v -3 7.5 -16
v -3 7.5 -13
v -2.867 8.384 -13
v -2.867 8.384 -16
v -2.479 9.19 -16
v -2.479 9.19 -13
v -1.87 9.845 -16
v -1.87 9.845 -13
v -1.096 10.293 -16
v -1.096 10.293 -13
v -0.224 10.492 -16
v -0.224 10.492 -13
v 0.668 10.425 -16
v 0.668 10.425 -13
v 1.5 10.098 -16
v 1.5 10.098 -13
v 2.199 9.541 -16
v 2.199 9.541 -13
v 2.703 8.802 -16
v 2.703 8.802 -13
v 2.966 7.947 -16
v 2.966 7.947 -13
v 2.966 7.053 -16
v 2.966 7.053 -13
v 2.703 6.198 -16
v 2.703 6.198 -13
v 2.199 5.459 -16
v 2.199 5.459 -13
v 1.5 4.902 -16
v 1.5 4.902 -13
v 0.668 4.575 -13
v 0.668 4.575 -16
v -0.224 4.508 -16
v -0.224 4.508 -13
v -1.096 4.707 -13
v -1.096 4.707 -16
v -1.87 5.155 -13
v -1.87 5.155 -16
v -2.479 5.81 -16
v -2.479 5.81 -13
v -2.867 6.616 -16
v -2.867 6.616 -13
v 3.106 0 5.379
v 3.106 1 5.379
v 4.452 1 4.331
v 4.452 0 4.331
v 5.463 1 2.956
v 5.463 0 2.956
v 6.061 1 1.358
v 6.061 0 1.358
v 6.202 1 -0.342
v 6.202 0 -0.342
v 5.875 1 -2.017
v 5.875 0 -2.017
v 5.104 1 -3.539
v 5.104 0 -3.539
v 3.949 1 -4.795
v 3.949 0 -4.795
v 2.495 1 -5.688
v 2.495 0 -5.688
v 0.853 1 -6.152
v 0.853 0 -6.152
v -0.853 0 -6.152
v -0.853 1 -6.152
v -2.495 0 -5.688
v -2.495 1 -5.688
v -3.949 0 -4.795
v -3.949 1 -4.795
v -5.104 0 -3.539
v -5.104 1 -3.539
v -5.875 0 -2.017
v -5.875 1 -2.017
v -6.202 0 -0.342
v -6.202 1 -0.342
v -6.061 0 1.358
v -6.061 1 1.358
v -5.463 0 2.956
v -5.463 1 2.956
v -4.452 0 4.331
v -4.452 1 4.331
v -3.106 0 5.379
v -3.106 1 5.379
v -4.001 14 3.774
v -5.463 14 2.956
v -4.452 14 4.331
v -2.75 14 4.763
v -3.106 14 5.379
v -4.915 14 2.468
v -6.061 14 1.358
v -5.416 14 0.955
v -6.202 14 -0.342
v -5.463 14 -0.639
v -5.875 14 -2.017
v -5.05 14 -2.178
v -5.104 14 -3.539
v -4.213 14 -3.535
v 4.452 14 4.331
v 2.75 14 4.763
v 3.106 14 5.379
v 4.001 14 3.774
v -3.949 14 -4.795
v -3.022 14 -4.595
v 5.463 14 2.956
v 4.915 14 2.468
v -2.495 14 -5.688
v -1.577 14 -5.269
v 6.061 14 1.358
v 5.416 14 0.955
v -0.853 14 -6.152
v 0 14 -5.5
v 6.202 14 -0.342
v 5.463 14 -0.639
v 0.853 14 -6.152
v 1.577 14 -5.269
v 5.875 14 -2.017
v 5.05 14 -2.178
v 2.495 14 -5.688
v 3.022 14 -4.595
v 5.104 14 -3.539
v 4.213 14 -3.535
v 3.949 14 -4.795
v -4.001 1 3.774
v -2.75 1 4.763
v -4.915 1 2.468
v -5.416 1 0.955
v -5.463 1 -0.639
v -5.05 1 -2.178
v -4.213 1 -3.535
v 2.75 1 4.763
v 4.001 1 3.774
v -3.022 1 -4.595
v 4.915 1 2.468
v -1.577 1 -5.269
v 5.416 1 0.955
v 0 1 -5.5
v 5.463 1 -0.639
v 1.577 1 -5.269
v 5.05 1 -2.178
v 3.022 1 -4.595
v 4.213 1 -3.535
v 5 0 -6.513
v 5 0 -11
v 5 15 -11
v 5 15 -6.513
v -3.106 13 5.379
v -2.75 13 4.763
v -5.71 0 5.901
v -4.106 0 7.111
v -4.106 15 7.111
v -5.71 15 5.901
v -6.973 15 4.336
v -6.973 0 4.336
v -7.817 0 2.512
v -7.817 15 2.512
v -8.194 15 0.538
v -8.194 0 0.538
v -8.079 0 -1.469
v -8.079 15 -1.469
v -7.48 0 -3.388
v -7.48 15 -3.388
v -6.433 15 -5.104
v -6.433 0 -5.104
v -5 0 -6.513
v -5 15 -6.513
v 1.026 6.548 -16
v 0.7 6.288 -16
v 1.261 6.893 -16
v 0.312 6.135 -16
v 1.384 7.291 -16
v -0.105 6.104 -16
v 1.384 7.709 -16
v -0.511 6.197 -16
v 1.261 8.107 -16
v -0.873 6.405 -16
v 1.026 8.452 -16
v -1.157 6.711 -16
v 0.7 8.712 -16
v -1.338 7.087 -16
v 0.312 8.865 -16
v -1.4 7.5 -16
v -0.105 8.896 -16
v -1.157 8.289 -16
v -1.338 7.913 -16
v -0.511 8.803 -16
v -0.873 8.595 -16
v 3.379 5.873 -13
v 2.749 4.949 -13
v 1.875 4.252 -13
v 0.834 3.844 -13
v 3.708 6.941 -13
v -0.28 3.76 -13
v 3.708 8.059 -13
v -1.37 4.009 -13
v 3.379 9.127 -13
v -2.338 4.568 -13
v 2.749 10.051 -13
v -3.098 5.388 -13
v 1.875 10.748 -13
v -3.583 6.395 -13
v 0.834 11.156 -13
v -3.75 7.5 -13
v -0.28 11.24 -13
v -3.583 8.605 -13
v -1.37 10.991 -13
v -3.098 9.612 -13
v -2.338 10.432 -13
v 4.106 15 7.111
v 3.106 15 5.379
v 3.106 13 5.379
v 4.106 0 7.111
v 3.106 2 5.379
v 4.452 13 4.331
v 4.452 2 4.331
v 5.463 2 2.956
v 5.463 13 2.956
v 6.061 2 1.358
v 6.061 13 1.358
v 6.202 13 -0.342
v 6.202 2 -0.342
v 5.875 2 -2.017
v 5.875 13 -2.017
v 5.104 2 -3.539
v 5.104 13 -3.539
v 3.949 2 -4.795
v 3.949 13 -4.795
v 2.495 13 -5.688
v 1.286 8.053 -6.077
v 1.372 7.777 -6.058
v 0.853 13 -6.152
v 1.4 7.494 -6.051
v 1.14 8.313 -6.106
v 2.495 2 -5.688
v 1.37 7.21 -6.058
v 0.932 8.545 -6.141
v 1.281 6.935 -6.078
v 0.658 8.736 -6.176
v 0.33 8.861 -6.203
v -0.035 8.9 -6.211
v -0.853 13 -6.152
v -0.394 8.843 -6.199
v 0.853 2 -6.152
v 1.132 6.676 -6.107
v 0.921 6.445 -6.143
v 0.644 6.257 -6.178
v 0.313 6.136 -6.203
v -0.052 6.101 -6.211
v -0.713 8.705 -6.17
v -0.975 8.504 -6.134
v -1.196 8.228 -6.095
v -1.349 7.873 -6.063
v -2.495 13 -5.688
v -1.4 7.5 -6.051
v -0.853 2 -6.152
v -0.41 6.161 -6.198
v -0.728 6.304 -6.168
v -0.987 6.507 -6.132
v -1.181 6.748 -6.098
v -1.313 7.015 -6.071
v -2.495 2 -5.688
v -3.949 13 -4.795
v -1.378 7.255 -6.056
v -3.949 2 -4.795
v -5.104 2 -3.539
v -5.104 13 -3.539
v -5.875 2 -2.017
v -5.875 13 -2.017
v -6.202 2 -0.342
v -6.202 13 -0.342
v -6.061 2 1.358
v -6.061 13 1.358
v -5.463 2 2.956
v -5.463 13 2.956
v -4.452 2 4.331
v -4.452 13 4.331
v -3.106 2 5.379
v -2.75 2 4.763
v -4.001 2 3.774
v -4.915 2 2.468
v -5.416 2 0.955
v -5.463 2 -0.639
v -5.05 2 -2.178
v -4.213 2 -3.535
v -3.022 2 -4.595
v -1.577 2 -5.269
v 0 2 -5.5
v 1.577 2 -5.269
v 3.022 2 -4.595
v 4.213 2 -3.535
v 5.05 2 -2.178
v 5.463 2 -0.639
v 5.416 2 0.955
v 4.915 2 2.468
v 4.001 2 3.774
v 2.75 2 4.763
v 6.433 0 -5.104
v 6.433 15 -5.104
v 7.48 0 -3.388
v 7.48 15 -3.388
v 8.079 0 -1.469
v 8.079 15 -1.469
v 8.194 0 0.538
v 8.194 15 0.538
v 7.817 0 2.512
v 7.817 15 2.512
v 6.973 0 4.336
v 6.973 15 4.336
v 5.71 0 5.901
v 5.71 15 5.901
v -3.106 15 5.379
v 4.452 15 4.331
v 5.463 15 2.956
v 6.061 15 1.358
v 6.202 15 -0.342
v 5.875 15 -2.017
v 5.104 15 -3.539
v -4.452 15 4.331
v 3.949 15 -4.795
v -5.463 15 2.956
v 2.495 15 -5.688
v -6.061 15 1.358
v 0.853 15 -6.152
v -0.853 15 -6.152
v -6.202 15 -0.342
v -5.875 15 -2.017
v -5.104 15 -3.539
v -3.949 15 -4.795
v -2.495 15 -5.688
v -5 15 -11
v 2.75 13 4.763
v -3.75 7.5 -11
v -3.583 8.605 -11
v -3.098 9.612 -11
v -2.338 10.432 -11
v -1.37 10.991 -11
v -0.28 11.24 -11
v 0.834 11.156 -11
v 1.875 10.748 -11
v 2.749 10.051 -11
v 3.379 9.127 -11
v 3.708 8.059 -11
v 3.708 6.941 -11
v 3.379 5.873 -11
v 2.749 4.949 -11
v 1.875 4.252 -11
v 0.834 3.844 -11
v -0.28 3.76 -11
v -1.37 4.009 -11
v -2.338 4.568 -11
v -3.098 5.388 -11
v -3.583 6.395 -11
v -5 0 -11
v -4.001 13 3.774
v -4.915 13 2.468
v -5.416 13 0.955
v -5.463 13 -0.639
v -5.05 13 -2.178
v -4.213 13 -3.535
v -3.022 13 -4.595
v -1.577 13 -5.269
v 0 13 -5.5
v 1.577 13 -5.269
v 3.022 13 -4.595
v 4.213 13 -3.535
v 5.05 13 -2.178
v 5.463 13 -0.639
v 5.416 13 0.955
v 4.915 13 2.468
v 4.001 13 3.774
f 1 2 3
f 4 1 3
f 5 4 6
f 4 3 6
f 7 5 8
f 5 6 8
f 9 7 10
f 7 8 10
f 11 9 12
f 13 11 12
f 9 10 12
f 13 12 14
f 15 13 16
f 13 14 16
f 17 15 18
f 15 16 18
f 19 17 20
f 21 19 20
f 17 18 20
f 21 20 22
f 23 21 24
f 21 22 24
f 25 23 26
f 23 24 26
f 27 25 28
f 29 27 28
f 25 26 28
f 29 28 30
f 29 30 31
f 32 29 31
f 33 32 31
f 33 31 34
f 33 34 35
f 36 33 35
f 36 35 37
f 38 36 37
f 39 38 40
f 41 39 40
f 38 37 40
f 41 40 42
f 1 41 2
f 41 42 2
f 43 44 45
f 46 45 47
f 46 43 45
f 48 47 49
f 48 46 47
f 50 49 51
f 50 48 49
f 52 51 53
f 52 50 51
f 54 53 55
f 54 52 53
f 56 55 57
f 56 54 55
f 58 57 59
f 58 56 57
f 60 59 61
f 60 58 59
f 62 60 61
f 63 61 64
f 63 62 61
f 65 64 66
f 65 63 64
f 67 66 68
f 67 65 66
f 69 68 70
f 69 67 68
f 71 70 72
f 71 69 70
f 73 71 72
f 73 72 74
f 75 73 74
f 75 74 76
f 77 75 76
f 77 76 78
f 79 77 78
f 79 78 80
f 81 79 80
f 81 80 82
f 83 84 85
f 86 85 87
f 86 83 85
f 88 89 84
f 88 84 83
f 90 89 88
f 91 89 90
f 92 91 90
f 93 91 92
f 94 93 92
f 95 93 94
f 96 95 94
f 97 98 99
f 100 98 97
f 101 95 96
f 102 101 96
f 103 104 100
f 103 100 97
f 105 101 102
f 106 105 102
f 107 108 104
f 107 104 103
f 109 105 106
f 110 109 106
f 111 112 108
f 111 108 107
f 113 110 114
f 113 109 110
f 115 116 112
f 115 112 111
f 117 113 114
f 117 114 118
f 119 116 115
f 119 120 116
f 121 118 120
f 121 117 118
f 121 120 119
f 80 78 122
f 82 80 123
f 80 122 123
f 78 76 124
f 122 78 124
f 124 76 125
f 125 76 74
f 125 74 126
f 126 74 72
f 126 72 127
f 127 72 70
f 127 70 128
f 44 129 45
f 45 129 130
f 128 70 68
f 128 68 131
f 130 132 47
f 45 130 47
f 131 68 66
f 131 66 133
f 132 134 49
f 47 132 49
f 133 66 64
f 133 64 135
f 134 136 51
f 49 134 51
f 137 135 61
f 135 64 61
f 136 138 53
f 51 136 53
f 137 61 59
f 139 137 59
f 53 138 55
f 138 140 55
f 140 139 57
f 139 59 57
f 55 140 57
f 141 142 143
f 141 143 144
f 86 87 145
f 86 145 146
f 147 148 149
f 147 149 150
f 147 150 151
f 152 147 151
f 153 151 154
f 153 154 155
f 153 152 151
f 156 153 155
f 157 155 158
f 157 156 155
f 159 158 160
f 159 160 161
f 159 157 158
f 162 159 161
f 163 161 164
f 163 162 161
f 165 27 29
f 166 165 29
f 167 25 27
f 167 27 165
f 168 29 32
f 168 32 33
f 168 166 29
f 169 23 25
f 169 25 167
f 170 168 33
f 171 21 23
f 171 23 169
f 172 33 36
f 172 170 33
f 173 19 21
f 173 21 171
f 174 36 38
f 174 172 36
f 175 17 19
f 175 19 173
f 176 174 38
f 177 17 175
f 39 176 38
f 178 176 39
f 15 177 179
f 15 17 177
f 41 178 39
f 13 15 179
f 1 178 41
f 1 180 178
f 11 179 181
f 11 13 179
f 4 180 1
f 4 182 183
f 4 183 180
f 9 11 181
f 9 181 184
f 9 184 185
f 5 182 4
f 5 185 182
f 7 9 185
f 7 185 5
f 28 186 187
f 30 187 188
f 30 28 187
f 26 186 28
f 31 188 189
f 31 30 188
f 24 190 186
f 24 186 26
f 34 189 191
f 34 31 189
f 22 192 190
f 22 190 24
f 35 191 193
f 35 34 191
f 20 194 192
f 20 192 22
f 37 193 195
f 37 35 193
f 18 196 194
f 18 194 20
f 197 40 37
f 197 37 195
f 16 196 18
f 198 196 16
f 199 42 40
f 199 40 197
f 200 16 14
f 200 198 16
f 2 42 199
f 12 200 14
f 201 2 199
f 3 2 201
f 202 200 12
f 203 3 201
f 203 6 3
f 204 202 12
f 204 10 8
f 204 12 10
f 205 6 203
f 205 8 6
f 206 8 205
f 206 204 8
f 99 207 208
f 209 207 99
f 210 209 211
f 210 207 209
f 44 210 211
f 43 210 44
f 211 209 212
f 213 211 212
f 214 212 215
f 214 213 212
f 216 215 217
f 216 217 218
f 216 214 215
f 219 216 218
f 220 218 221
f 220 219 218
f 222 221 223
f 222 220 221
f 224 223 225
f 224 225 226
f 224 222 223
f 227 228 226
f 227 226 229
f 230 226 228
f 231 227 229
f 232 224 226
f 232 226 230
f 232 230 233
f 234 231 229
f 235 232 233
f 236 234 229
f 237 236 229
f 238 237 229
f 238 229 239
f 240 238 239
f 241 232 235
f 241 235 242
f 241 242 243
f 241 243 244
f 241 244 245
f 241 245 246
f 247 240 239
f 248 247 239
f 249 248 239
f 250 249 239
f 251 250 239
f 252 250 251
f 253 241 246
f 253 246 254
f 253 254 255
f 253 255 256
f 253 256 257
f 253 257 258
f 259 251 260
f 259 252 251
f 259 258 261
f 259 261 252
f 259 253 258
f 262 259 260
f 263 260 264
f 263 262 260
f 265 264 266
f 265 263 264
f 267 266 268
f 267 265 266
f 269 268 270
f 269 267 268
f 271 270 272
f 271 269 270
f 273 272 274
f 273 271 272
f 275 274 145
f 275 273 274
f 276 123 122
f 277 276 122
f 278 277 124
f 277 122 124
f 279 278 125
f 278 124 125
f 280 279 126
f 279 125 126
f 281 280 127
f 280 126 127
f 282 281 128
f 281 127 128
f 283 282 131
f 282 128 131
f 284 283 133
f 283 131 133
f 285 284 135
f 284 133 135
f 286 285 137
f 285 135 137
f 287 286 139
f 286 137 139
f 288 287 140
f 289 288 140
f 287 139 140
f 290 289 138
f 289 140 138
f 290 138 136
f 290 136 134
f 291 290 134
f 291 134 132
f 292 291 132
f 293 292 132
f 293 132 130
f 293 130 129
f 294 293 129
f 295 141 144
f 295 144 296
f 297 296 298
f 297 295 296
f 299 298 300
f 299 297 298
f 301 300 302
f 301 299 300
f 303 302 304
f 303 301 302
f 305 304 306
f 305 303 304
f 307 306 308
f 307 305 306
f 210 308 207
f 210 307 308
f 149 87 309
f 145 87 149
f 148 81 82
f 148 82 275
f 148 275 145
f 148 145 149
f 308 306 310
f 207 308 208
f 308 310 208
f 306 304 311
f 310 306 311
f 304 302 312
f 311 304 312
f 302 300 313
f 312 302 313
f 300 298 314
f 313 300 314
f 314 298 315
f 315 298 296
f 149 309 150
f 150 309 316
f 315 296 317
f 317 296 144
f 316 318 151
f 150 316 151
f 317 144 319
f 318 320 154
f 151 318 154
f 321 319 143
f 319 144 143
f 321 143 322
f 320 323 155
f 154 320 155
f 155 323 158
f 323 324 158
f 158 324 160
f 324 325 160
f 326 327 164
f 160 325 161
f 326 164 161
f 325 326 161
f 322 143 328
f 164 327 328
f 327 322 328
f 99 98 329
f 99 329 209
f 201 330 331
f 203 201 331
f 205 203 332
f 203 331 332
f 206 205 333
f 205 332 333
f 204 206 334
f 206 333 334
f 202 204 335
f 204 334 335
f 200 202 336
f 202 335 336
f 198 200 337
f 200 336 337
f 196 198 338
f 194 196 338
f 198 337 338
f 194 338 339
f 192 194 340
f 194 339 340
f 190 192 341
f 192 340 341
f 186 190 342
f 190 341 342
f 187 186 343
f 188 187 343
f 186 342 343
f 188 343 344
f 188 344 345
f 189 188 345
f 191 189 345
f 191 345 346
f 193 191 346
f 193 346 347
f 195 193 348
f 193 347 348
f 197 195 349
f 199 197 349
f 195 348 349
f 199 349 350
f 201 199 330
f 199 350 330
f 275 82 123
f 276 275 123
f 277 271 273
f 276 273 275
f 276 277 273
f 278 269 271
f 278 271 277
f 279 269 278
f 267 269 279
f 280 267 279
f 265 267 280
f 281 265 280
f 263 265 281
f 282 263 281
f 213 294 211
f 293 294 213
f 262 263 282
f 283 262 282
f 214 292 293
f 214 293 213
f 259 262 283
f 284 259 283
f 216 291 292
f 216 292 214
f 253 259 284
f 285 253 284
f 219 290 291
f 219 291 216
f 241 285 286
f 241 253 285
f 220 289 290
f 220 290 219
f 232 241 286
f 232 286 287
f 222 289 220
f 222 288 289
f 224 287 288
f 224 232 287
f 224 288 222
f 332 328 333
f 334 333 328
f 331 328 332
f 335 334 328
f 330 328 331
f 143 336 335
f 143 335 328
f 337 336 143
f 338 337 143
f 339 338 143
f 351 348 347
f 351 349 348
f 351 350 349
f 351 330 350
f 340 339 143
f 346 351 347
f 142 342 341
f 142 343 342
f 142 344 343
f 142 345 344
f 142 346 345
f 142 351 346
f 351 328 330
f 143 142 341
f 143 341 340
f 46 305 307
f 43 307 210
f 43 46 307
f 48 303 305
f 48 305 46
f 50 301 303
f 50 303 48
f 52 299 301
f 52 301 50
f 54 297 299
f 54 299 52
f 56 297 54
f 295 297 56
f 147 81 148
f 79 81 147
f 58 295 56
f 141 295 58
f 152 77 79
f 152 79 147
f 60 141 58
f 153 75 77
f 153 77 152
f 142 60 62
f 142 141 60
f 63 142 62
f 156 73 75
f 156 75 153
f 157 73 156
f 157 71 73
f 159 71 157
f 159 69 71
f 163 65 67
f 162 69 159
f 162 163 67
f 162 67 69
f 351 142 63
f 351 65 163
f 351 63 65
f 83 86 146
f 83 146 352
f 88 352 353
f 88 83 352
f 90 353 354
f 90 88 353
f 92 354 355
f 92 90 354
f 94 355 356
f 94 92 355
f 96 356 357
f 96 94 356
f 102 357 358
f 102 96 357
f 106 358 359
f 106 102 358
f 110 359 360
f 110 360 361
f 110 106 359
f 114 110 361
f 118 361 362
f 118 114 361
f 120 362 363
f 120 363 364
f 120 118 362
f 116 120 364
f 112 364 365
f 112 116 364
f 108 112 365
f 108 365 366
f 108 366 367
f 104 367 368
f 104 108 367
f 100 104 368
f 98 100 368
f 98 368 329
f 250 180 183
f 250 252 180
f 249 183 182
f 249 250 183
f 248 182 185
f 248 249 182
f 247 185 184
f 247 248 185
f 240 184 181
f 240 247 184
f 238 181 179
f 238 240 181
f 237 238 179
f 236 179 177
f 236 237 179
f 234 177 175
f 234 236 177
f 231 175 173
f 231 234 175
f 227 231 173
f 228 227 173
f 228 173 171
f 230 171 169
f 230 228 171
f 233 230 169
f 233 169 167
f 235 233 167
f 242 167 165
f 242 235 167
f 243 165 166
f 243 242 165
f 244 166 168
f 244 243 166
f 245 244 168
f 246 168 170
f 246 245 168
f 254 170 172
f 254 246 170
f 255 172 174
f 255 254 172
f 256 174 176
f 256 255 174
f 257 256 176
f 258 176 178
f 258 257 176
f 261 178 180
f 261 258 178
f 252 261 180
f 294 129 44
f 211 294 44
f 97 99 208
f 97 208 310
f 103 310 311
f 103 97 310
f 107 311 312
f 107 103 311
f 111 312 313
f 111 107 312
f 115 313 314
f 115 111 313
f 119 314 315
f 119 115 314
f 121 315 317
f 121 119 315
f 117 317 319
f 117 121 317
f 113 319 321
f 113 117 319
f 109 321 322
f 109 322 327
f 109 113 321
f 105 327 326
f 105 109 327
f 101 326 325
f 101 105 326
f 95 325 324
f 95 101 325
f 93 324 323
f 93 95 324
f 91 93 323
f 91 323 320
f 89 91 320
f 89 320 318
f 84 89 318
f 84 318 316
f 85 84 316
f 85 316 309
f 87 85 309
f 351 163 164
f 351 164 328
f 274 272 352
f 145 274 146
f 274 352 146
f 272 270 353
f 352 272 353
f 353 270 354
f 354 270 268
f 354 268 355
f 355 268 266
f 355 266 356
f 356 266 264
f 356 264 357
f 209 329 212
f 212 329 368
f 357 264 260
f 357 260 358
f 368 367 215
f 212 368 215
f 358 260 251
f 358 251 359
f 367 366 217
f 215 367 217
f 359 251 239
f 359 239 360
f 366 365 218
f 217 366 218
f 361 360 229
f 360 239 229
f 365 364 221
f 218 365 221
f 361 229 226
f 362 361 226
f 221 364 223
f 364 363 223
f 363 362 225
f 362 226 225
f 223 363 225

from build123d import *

# Parameters (mm, degrees)
SKETCH1_R               = 6.211279156
BOSS_EXTRUDE1_DEPTH     = 15
CUT_EXTRUDE1_DEPTH      = 21.332857777
CUT_EXTRUDE1_DEPTH_BACK = 21.332857777
BOSS_EXTRUDE3_DEPTH     = 1
SKETCH6_R               = 1.4
CUT_EXTRUDE2_DEPTH      = 10
SKETCH7_R               = 3.75
BOSS_EXTRUDE4_DEPTH     = 2
SKETCH8_R               = 3
BOSS_EXTRUDE5_DEPTH     = 3
CUT_EXTRUDE3_DEPTH      = 29.749810043
CUT_EXTRUDE3_DEPTH_BACK = 29.749810043
SKETCH9_R               = 1.4


with BuildPart() as part:
    # Sketch1 → Boss-Extrude1 (new body)
    with BuildSketch(Plane(origin=(0, 0, 0), x_dir=(1, 0, 0), z_dir=(0, 1, 0))):
        with BuildLine():
            Line((-5, 6.513455717), (-5, 11))
            Line((-5, 11), (5, 11))
            Line((5, 11), (5, 6.513455717))
            ThreePointArc((5, 6.513455717), (0, -8.211279156), (-5, 6.513455717))
        make_face()
        with Locations(Location((0, 0, 0), (0, 0, 270))):
            Circle(SKETCH1_R, mode=Mode.SUBTRACT)
    extrude(amount=BOSS_EXTRUDE1_DEPTH)

    # Sketch4 → Cut-Extrude1 (cut, two sides: drawn at the far end of the back side and taken through both)
    with BuildSketch(Plane(origin=(0, 15, 0), x_dir=(1, 0, 0), z_dir=(0, 1, 0)).offset(-CUT_EXTRUDE1_DEPTH_BACK)):
        with BuildLine():
            Line((-3.105639578, -5.379125539), (-4.105639578, -7.111176346))
            ThreePointArc((-4.105639578, -7.111176346), (0, -8.211279156), (4.105639578, -7.111176346))
            Line((4.105639578, -7.111176346), (3.105639578, -5.379125539))
            ThreePointArc((3.105639578, -5.379125539), (0, -6.211279156), (-3.105639578, -5.379125539))
        make_face()
    extrude(amount=CUT_EXTRUDE1_DEPTH + CUT_EXTRUDE1_DEPTH_BACK, mode=Mode.SUBTRACT)

    # Sketch5 → Boss-Extrude3 (add)
    with BuildSketch(Plane(origin=(0, 1, 0), x_dir=(-1, 0, 0), z_dir=(0, -1, 0))):
        with BuildLine():
            Line((3.105639578, -5.379125539), (2.749999992, -4.763139708))
            ThreePointArc((2.749999992, -4.763139708), (0, 5.499999985), (-2.749999992, -4.763139708))
            Line((-2.749999992, -4.763139708), (-3.105639578, -5.379125539))
            ThreePointArc((-3.105639578, -5.379125539), (0, 6.211279156), (3.105639578, -5.379125539))
        make_face()
    boss_extrude3 = extrude(amount=-BOSS_EXTRUDE3_DEPTH)

    # Mirror1: Boss-Extrude3 across plane
    add(boss_extrude3.mirror(Plane.ZX.offset(7.5)))

    # Sketch6 → Cut-Extrude2 (cut)
    with BuildSketch(Plane(origin=(0, 0, -11), x_dir=(-1, 0, 0), z_dir=(0, 0, -1))):
        with Locations((0, 7.5)):
            Circle(SKETCH6_R)
    extrude(amount=-CUT_EXTRUDE2_DEPTH, mode=Mode.SUBTRACT)

    # Sketch7 → Boss-Extrude4 (add)
    with BuildSketch(Plane(origin=(0, 0, -11), x_dir=(-1, 0, 0), z_dir=(0, 0, -1))):
        with Locations((0, 7.5)):
            Circle(SKETCH7_R)
    extrude(amount=BOSS_EXTRUDE4_DEPTH)

    # Sketch8 → Boss-Extrude5 (add)
    with BuildSketch(Plane(origin=(0, 0, -13), x_dir=(-1, 0, 0), z_dir=(0, 0, -1))):
        with Locations((0, 7.5)):
            Circle(SKETCH8_R)
    extrude(amount=BOSS_EXTRUDE5_DEPTH)

    # Sketch9 → Cut-Extrude3 (cut, two sides: drawn at the far end of the back side and taken through both)
    with BuildSketch(Plane(origin=(0, 0, -16), x_dir=(-1, 0, 0), z_dir=(0, 0, -1)).offset(-CUT_EXTRUDE3_DEPTH_BACK)):
        with Locations((0, 7.5)):
            Circle(SKETCH9_R)
    extrude(amount=CUT_EXTRUDE3_DEPTH + CUT_EXTRUDE3_DEPTH_BACK, mode=Mode.SUBTRACT)


solid = part.part
